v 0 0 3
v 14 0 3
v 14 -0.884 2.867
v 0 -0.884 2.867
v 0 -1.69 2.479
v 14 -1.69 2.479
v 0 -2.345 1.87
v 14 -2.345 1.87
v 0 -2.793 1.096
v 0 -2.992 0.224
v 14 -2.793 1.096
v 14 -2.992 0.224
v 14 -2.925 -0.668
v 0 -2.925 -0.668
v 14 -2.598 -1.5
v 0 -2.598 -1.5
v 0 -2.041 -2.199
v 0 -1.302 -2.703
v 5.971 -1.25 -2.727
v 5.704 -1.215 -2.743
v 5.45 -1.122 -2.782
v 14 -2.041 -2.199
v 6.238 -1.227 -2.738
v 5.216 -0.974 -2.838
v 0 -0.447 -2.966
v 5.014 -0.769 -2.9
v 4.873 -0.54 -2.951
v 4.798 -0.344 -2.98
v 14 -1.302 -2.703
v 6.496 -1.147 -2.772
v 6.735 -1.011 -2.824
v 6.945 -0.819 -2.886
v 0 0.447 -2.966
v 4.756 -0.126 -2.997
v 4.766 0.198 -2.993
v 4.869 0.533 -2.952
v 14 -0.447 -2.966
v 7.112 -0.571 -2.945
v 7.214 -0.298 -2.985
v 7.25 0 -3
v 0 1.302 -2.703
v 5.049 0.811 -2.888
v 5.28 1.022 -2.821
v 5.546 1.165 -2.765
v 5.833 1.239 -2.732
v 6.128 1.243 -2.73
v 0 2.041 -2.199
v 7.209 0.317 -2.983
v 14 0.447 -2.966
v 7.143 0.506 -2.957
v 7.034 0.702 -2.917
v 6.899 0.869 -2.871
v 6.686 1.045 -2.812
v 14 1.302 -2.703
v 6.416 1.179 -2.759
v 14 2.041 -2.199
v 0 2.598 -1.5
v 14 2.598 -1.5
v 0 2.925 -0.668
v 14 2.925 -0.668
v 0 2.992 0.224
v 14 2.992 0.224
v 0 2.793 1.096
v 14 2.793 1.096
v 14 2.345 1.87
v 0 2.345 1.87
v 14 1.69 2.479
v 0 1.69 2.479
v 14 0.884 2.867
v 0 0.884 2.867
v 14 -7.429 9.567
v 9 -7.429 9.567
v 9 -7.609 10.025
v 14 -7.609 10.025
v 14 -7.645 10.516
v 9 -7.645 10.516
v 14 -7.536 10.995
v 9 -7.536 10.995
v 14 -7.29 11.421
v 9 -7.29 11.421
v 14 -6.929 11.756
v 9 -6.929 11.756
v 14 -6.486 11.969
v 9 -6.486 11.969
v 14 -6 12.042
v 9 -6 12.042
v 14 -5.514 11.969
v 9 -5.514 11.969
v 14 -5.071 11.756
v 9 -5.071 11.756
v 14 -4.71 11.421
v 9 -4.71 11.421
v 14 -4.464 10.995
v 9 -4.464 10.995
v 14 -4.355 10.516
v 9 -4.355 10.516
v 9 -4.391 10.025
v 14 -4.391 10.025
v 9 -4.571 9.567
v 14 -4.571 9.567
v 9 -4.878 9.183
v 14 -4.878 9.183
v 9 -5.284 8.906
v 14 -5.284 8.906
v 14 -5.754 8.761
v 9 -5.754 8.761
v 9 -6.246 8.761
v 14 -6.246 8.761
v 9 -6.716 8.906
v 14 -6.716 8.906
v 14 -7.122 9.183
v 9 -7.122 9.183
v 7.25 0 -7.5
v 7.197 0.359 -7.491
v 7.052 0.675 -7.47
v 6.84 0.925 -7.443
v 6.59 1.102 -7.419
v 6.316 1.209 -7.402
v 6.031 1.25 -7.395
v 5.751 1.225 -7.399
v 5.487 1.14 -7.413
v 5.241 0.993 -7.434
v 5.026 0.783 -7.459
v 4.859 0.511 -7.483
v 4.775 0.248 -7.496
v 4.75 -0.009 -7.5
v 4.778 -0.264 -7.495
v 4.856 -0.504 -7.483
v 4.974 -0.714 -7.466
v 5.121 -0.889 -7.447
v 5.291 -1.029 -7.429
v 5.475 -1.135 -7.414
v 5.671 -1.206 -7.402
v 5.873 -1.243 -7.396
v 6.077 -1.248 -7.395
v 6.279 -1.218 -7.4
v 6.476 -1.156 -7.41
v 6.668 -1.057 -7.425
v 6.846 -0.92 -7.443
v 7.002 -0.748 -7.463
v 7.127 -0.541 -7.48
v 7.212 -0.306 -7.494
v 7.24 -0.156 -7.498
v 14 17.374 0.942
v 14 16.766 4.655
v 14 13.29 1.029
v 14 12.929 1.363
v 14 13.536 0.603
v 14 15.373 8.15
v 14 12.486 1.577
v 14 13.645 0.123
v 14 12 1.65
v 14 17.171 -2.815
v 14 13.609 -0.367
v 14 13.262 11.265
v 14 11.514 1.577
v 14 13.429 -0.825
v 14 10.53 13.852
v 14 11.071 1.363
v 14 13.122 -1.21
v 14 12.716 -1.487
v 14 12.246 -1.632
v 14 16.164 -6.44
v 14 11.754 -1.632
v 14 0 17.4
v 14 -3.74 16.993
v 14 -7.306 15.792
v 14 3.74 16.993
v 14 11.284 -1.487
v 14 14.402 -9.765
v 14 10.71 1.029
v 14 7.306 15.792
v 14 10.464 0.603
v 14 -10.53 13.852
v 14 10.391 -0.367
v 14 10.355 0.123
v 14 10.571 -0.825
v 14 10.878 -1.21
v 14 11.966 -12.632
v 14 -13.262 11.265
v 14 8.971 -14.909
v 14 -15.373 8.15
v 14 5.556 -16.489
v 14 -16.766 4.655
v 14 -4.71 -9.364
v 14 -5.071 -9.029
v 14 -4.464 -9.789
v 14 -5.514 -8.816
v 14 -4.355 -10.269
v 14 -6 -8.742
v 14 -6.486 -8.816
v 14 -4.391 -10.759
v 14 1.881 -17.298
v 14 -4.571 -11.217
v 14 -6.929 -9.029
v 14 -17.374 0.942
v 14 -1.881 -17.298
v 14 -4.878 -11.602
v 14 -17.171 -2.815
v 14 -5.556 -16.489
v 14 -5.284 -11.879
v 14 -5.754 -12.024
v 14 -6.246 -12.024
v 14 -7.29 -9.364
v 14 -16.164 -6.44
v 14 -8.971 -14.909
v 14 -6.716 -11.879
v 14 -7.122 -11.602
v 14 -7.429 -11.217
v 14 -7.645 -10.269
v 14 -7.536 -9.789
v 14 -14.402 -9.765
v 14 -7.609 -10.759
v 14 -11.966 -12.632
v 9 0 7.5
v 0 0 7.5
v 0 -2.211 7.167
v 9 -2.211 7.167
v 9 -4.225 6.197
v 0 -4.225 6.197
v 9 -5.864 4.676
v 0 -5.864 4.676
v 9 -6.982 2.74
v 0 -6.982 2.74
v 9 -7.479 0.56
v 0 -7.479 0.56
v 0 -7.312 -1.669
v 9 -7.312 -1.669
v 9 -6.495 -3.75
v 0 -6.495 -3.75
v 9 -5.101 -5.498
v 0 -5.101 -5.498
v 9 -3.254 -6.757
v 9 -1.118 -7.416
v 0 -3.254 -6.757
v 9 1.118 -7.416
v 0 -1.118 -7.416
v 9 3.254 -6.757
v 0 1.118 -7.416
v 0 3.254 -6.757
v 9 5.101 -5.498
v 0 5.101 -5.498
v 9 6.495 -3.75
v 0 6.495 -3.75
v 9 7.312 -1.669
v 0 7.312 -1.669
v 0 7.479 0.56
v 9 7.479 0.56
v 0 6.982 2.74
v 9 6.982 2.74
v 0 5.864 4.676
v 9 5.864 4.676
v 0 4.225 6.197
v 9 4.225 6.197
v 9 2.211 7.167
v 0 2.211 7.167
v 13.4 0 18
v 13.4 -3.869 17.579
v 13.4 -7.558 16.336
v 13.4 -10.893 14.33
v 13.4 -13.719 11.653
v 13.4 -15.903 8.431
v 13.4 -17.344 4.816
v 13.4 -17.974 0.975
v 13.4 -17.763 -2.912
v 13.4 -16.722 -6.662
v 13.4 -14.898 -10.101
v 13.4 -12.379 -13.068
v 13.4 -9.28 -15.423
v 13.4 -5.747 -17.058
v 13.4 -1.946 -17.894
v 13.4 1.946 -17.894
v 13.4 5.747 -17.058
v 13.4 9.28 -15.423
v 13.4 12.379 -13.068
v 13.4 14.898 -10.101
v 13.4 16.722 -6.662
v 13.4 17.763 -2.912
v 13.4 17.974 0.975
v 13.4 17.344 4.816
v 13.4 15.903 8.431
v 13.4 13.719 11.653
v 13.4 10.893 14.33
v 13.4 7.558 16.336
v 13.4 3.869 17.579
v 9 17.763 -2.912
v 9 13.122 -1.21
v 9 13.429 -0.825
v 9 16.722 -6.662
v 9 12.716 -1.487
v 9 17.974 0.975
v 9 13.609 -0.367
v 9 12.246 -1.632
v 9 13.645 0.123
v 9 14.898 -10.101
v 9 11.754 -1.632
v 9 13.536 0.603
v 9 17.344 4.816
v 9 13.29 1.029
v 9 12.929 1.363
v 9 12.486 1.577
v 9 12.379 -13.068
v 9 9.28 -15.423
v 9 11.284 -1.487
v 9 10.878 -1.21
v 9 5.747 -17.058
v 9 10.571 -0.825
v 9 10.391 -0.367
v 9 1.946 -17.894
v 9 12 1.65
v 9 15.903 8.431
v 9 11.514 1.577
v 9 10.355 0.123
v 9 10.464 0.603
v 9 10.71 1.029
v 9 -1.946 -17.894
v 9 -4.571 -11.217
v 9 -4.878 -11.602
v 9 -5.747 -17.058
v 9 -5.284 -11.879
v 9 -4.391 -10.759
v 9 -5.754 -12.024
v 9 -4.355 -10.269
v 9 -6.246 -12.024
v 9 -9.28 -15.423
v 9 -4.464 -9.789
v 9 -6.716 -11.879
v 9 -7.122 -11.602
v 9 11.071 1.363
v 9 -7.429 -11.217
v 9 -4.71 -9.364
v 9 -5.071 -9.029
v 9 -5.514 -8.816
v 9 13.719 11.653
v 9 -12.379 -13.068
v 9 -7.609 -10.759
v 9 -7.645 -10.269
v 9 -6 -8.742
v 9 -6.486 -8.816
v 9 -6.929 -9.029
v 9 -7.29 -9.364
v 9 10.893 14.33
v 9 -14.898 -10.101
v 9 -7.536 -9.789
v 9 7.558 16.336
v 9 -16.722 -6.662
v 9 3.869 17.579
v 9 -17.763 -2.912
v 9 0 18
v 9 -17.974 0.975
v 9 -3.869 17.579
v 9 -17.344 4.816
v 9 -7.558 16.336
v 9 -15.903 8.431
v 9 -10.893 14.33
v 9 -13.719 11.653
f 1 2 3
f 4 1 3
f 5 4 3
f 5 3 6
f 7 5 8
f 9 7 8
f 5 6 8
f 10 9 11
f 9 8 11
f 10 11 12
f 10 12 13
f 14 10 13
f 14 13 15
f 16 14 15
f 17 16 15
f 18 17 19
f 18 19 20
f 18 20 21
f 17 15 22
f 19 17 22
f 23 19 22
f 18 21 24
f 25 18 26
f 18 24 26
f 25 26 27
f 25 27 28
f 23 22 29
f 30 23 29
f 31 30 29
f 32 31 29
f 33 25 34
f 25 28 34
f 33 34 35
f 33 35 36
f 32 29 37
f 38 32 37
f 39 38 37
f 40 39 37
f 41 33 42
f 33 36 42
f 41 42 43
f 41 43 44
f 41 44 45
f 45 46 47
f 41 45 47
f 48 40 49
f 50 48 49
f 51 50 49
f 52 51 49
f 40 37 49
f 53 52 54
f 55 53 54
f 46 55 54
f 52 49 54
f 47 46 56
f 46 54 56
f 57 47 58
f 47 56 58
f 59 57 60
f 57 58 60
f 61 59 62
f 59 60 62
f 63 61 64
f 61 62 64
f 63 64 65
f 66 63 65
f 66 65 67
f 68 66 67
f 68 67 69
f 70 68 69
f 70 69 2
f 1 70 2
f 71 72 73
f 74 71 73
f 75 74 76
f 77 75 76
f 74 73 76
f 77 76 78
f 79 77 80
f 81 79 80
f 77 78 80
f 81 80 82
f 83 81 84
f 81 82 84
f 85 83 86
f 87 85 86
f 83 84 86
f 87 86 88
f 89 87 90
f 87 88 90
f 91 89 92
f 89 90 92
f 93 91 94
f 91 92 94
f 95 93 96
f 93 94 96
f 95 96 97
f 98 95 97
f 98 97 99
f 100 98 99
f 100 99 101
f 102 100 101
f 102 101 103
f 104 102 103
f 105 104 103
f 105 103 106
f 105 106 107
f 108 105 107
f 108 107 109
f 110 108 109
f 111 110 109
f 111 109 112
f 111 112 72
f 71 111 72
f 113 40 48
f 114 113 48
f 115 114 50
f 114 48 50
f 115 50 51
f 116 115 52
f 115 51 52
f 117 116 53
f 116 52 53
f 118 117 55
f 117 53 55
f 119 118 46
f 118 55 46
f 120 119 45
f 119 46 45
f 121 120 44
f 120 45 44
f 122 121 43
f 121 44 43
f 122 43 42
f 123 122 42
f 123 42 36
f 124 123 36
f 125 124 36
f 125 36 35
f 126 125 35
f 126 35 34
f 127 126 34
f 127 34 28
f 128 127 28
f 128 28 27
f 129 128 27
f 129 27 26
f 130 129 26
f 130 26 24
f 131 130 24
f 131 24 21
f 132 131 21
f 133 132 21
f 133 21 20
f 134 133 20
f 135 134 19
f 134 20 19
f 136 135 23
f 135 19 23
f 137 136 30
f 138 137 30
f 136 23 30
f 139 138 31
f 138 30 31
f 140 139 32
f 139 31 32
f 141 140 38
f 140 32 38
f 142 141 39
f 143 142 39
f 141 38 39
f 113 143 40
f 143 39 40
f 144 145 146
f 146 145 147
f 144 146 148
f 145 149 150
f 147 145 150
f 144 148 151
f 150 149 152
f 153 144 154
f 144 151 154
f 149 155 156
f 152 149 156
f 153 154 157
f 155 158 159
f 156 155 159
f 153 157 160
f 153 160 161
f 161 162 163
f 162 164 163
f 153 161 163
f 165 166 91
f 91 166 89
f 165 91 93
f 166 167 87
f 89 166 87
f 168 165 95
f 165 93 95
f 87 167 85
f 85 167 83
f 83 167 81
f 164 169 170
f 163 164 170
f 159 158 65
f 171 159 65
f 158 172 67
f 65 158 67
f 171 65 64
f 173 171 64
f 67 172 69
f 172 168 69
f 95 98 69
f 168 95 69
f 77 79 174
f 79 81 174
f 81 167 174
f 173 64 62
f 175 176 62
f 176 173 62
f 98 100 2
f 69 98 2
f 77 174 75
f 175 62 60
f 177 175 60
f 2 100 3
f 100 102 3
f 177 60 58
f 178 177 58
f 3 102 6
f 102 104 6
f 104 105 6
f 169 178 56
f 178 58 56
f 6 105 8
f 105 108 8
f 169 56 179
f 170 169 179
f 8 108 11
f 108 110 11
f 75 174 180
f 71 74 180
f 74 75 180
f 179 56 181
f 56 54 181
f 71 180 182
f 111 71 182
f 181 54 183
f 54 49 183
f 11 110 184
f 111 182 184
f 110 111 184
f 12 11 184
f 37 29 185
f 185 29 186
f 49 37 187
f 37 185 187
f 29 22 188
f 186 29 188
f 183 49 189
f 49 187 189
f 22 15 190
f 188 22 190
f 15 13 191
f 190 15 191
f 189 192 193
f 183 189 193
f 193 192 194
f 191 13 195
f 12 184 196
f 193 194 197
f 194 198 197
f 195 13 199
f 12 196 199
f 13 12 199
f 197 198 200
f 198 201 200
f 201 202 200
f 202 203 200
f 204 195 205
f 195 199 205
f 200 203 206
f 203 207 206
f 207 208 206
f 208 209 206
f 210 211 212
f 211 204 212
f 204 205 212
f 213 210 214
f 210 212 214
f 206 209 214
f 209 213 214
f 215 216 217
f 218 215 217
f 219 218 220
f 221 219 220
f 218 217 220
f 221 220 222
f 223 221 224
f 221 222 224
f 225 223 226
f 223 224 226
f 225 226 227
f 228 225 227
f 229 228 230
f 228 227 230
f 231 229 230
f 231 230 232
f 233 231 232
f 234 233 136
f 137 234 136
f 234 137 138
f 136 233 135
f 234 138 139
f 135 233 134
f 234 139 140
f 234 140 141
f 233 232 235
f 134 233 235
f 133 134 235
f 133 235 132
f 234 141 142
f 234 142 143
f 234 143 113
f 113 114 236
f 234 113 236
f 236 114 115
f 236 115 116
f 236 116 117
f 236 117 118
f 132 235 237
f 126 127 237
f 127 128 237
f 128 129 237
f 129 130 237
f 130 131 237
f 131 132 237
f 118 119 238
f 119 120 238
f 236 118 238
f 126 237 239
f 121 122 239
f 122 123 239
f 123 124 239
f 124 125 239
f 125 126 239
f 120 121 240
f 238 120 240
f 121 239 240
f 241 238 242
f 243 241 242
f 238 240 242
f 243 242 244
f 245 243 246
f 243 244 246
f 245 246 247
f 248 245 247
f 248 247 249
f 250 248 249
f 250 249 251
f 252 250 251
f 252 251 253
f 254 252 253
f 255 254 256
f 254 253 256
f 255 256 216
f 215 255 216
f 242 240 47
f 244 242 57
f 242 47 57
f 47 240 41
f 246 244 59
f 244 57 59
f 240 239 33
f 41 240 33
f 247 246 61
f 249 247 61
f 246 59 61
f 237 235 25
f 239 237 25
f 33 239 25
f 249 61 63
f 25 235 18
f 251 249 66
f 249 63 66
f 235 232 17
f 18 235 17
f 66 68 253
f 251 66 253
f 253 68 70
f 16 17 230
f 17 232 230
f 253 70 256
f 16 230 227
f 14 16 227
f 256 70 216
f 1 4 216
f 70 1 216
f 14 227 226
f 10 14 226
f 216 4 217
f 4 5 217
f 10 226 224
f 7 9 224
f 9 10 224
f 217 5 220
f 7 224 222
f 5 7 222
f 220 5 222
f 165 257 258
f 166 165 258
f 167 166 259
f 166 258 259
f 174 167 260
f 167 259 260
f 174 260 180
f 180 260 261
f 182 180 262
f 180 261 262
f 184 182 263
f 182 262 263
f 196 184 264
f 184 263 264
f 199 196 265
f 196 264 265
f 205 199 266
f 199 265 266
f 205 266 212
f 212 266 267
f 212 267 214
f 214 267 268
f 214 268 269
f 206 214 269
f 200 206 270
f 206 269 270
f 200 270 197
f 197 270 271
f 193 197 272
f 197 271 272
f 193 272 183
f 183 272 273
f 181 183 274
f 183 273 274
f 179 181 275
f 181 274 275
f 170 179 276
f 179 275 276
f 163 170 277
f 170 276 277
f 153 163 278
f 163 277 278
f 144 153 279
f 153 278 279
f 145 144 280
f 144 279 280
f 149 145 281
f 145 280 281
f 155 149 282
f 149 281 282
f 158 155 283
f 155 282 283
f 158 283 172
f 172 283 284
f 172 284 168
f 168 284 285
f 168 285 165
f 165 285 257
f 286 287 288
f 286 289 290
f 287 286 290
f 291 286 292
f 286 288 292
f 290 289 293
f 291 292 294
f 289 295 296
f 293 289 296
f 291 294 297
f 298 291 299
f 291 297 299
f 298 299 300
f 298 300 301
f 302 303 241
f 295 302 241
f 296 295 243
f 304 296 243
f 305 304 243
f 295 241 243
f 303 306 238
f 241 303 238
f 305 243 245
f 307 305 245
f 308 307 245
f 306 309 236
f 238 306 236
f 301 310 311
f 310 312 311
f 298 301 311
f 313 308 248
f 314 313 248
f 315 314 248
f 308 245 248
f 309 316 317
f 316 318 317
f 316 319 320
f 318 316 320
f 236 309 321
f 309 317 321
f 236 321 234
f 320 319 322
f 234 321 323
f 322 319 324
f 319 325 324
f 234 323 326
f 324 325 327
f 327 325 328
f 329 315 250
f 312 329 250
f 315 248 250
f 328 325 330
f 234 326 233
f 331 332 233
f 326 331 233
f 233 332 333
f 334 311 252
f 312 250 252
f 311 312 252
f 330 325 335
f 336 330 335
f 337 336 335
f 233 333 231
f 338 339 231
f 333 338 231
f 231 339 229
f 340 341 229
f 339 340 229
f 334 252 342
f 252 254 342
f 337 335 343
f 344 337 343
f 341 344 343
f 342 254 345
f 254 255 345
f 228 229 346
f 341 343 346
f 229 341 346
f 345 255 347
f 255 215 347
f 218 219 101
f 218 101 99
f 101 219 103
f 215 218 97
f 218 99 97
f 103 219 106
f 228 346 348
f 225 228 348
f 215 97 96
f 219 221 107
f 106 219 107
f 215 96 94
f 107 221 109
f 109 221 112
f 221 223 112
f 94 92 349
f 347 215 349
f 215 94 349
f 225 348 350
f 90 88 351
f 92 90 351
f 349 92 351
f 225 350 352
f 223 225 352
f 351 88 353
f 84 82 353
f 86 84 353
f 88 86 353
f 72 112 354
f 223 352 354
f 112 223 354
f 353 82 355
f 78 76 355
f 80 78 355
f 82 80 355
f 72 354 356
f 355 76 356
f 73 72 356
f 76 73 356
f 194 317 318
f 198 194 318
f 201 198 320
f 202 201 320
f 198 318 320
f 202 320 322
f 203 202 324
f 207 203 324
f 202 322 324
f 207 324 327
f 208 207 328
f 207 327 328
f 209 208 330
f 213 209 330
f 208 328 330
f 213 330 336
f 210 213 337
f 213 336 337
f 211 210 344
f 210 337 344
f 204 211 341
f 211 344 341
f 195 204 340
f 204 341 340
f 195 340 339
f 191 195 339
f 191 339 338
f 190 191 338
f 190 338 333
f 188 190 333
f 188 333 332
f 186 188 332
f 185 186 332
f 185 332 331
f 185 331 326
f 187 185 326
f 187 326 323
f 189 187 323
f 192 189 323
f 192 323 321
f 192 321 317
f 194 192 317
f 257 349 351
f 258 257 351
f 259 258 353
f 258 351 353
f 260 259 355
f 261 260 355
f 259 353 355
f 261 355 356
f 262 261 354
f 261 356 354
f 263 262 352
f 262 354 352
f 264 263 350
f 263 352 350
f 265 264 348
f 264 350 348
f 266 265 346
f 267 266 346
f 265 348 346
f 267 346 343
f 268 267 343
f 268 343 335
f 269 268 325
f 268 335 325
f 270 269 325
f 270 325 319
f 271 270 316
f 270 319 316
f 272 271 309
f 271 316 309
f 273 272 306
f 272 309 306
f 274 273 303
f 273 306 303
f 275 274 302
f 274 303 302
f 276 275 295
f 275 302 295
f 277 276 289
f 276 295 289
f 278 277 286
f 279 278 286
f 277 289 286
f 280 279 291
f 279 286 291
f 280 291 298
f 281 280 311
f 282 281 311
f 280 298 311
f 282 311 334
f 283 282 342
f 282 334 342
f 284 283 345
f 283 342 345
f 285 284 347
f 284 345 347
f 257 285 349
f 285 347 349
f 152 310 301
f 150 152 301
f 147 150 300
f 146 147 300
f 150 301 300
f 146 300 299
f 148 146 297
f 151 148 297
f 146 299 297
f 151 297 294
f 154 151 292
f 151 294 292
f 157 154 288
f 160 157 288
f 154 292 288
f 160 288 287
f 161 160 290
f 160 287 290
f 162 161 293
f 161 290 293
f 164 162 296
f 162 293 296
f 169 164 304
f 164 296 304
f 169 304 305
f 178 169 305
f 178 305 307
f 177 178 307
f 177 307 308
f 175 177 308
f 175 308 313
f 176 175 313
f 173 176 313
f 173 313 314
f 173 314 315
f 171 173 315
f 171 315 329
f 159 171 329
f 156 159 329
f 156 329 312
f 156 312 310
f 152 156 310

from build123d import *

# Parameters (mm, degrees)
ESQUISSE2_R                  = 1.25
ENL_V_MAT_EXTRU_1_DEPTH      = 30.051678093
TROU_TARAUD_M41_D            = 3.3
R_P_TITION_CIRCULAIRE1_COUNT = 3
CHANFREIN1_SIZE              = 0.6


with BuildPart() as part:
    # Esquisse1 → Révolution1 (revolve)
    with BuildSketch(Plane.XY, mode=Mode.PRIVATE) as r_volution1_sk:
        Polygon((0, 3), (14, 3), (14, 18), (9, 18), (9, 7.5), (0, 7.5), align=None)
    revolve(r_volution1_sk.sketch.rotate(Axis((0, 0, 0), (1, 0, 0)), 90), axis=Axis((0, 0, 0), (1, 0, 0)))

    # Esquisse2 → Enlèv. mat.-Extru.1 (cut, through all)
    with BuildSketch(Plane.XY):
        with Locations((6, 0)):
            Circle(ESQUISSE2_R)
    extrude(amount=-ENL_V_MAT_EXTRU_1_DEPTH, mode=Mode.SUBTRACT)

    # Trou taraudé M41 (through all)
    with Locations(Plane(origin=(14, 0, 0), x_dir=(0, 0, -1), z_dir=(1, 0, 0))):
        with Locations((0, 12)):
            trou_taraud_m41 = Hole(TROU_TARAUD_M41_D / 2)

    # Répétition circulaire1: Trou taraudé M41 ×3 about axis
    r_p_tition_circulaire1_axis = Axis((0, 0, 0), (1, 0, 0))
    for i in range(1, R_P_TITION_CIRCULAIRE1_COUNT):
        add(trou_taraud_m41.rotate(r_p_tition_circulaire1_axis, i * 360 / R_P_TITION_CIRCULAIRE1_COUNT), mode=Mode.SUBTRACT)

    # Chanfrein1
    chanfrein1_edges = [part.edges().sort_by_distance(p)[0] for p in [
        (14, 0, -18),
    ]]
    chamfer(chanfrein1_edges, length=CHANFREIN1_SIZE)


solid = part.part
